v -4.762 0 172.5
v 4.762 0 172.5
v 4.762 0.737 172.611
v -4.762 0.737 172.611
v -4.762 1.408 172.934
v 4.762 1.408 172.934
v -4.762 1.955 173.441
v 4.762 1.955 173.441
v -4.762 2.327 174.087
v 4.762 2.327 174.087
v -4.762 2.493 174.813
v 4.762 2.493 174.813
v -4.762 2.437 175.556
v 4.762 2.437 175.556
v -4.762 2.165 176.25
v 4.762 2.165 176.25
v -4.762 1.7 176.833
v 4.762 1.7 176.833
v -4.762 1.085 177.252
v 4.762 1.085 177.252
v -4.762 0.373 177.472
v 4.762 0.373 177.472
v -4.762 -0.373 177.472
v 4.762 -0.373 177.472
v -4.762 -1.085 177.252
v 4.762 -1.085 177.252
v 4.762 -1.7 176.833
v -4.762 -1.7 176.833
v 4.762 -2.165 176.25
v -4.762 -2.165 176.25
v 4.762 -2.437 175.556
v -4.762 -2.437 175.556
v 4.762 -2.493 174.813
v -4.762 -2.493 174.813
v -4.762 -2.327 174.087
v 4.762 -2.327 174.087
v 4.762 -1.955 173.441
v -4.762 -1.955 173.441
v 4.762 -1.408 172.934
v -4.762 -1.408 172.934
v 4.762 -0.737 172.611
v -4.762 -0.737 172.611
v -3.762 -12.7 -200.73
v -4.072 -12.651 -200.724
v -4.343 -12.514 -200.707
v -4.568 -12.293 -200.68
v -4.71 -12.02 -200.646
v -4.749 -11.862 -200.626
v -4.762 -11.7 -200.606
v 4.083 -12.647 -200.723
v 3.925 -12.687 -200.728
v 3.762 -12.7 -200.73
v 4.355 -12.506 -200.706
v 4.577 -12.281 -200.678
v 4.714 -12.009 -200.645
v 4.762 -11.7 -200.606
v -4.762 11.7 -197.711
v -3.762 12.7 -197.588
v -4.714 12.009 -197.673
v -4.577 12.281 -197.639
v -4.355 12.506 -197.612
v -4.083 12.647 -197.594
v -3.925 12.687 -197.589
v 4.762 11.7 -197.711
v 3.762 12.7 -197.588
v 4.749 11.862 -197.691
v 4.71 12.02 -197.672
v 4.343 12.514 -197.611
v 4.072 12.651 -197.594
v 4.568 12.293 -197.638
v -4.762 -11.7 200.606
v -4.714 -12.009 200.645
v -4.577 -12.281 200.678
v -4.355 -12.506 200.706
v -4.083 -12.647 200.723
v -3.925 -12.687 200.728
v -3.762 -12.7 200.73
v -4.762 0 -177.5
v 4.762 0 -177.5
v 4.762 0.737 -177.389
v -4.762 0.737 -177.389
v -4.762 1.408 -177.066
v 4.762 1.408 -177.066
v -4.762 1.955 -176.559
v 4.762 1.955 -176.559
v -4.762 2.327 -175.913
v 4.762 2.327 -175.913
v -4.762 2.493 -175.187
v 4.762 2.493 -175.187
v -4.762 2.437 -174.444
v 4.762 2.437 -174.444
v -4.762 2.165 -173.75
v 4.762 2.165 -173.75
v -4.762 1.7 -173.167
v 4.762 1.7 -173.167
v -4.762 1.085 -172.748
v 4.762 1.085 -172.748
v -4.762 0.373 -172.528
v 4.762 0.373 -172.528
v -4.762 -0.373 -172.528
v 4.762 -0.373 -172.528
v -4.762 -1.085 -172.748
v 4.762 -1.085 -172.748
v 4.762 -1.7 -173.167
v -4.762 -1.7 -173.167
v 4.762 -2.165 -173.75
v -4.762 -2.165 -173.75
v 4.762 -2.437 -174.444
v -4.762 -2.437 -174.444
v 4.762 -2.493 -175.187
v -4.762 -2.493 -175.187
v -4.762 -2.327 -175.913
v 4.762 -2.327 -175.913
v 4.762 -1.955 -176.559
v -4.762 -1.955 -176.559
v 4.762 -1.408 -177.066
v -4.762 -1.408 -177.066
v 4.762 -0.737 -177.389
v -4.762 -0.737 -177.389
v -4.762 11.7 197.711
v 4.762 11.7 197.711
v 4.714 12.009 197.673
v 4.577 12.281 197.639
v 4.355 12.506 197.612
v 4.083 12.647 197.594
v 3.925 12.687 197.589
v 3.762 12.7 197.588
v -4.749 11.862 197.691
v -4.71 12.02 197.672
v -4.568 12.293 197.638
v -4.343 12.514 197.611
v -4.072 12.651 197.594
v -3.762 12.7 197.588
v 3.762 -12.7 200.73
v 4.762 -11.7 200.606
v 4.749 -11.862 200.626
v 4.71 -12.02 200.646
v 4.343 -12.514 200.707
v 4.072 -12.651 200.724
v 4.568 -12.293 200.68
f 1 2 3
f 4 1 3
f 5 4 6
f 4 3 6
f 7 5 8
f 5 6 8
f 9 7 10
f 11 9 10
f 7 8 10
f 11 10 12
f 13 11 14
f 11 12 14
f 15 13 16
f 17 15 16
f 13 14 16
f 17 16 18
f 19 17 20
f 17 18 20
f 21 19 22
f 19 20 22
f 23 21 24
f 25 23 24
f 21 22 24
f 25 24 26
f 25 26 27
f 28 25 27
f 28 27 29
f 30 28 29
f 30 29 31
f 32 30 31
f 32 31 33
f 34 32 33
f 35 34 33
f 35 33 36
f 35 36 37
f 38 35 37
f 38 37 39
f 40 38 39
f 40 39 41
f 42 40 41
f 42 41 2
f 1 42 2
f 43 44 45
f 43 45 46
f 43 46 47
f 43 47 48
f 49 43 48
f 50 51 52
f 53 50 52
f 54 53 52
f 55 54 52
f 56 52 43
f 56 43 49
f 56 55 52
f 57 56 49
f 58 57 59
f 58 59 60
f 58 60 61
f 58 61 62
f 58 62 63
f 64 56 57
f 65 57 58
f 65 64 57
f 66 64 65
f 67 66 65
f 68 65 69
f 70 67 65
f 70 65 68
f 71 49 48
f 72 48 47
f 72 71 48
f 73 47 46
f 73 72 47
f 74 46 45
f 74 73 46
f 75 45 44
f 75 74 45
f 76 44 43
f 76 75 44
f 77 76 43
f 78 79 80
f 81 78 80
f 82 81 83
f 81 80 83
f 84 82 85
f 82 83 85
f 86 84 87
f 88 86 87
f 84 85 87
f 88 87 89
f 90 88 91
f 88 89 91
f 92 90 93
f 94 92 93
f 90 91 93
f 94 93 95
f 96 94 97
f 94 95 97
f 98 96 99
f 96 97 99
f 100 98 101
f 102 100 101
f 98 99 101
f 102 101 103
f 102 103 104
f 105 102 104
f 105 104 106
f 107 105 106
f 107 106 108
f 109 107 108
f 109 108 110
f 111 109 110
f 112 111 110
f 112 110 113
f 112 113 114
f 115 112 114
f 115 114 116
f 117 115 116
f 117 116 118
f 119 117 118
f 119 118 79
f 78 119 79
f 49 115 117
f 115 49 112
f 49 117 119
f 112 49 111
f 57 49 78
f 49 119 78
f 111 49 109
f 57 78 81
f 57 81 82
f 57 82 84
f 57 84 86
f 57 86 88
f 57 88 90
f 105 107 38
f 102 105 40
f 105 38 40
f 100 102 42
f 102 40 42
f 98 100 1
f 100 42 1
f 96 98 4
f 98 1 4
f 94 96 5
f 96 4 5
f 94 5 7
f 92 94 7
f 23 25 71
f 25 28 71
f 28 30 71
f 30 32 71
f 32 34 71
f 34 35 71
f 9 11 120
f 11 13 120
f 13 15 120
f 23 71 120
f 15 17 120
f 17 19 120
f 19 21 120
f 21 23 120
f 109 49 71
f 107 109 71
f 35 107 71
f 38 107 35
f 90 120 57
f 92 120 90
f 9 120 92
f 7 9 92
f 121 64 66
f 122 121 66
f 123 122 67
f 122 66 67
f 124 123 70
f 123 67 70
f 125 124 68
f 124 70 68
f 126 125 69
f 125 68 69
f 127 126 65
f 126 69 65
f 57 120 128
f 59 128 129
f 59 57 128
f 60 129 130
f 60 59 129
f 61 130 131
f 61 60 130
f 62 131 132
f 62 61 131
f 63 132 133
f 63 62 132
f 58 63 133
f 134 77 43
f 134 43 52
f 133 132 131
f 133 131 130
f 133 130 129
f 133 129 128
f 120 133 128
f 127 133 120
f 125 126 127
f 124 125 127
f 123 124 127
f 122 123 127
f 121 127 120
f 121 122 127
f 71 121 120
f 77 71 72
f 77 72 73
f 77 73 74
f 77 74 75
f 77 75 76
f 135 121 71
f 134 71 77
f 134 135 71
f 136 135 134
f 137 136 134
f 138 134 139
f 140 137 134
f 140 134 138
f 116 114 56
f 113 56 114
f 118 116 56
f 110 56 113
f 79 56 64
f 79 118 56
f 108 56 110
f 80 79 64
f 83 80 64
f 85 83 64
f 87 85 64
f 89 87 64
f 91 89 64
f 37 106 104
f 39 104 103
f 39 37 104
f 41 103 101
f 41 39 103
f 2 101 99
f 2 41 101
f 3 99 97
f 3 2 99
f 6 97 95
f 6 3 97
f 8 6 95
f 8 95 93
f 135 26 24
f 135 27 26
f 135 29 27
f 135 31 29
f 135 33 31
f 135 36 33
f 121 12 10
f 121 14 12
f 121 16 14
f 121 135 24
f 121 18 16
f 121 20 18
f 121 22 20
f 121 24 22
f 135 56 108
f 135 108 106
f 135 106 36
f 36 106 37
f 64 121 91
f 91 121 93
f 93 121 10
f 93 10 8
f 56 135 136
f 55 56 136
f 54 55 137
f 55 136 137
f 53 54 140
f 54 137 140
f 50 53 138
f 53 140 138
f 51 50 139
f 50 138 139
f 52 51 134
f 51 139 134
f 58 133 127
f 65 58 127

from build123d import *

# Parameters (mm, degrees)
ESBO_O1_W                 = 9.525
ESBO_O1_H                 = 25.4
RESSALTO_EXTRUS_O1_DEPTH  = 210
FILETE1_R                 = 1
CORTE_EXTRUS_O1_START     = -9.525
CORTE_EXTRUS_O1_DEPTH     = 9.525
FURO_ROSCADO_DE_M6X1_01_D = 5


# Read off the part's stored shape, not the designer's step: Corte-extrusão1
with BuildPart() as part:
    # Esboço1 → Ressalto-extrusão1 (new, symmetric)
    with BuildSketch(Plane.XY):
        Rectangle(ESBO_O1_W, ESBO_O1_H)
    extrude(amount=RESSALTO_EXTRUS_O1_DEPTH, both=True)

    # Filete1
    filete1_edges = [part.edges().sort_by_distance(p)[0] for p in [
        (4.7625, -12.7, 0),
        (-4.7625, -12.7, 0),
        (-4.7625, 12.7, 0),
        (4.7625, 12.7, 0),
    ]]
    fillet(filete1_edges, radius=FILETE1_R)

    # Corte-extrusão1 outline → Corte-extrusão1 (cut)
    with BuildSketch(Plane.ZY.offset(4.7625).offset(CORTE_EXTRUS_O1_START)):
        Polygon((197.587539651, 12.7), (200.73, -12.7), (210, -12.7), (210, 12.7), align=None)
        Polygon((-210, -12.7), (-200.73, -12.7), (-197.587539651, 12.7), (-210, 12.7), align=None)
    extrude(amount=CORTE_EXTRUS_O1_DEPTH, mode=Mode.SUBTRACT)

    # Furo roscado de M6x1.01 (through all)
    with Locations(Plane.ZY.offset(4.7625)):
        with Locations((-175, 0), (175, 0)):
            Hole(FURO_ROSCADO_DE_M6X1_01_D / 2)


solid = part.part
